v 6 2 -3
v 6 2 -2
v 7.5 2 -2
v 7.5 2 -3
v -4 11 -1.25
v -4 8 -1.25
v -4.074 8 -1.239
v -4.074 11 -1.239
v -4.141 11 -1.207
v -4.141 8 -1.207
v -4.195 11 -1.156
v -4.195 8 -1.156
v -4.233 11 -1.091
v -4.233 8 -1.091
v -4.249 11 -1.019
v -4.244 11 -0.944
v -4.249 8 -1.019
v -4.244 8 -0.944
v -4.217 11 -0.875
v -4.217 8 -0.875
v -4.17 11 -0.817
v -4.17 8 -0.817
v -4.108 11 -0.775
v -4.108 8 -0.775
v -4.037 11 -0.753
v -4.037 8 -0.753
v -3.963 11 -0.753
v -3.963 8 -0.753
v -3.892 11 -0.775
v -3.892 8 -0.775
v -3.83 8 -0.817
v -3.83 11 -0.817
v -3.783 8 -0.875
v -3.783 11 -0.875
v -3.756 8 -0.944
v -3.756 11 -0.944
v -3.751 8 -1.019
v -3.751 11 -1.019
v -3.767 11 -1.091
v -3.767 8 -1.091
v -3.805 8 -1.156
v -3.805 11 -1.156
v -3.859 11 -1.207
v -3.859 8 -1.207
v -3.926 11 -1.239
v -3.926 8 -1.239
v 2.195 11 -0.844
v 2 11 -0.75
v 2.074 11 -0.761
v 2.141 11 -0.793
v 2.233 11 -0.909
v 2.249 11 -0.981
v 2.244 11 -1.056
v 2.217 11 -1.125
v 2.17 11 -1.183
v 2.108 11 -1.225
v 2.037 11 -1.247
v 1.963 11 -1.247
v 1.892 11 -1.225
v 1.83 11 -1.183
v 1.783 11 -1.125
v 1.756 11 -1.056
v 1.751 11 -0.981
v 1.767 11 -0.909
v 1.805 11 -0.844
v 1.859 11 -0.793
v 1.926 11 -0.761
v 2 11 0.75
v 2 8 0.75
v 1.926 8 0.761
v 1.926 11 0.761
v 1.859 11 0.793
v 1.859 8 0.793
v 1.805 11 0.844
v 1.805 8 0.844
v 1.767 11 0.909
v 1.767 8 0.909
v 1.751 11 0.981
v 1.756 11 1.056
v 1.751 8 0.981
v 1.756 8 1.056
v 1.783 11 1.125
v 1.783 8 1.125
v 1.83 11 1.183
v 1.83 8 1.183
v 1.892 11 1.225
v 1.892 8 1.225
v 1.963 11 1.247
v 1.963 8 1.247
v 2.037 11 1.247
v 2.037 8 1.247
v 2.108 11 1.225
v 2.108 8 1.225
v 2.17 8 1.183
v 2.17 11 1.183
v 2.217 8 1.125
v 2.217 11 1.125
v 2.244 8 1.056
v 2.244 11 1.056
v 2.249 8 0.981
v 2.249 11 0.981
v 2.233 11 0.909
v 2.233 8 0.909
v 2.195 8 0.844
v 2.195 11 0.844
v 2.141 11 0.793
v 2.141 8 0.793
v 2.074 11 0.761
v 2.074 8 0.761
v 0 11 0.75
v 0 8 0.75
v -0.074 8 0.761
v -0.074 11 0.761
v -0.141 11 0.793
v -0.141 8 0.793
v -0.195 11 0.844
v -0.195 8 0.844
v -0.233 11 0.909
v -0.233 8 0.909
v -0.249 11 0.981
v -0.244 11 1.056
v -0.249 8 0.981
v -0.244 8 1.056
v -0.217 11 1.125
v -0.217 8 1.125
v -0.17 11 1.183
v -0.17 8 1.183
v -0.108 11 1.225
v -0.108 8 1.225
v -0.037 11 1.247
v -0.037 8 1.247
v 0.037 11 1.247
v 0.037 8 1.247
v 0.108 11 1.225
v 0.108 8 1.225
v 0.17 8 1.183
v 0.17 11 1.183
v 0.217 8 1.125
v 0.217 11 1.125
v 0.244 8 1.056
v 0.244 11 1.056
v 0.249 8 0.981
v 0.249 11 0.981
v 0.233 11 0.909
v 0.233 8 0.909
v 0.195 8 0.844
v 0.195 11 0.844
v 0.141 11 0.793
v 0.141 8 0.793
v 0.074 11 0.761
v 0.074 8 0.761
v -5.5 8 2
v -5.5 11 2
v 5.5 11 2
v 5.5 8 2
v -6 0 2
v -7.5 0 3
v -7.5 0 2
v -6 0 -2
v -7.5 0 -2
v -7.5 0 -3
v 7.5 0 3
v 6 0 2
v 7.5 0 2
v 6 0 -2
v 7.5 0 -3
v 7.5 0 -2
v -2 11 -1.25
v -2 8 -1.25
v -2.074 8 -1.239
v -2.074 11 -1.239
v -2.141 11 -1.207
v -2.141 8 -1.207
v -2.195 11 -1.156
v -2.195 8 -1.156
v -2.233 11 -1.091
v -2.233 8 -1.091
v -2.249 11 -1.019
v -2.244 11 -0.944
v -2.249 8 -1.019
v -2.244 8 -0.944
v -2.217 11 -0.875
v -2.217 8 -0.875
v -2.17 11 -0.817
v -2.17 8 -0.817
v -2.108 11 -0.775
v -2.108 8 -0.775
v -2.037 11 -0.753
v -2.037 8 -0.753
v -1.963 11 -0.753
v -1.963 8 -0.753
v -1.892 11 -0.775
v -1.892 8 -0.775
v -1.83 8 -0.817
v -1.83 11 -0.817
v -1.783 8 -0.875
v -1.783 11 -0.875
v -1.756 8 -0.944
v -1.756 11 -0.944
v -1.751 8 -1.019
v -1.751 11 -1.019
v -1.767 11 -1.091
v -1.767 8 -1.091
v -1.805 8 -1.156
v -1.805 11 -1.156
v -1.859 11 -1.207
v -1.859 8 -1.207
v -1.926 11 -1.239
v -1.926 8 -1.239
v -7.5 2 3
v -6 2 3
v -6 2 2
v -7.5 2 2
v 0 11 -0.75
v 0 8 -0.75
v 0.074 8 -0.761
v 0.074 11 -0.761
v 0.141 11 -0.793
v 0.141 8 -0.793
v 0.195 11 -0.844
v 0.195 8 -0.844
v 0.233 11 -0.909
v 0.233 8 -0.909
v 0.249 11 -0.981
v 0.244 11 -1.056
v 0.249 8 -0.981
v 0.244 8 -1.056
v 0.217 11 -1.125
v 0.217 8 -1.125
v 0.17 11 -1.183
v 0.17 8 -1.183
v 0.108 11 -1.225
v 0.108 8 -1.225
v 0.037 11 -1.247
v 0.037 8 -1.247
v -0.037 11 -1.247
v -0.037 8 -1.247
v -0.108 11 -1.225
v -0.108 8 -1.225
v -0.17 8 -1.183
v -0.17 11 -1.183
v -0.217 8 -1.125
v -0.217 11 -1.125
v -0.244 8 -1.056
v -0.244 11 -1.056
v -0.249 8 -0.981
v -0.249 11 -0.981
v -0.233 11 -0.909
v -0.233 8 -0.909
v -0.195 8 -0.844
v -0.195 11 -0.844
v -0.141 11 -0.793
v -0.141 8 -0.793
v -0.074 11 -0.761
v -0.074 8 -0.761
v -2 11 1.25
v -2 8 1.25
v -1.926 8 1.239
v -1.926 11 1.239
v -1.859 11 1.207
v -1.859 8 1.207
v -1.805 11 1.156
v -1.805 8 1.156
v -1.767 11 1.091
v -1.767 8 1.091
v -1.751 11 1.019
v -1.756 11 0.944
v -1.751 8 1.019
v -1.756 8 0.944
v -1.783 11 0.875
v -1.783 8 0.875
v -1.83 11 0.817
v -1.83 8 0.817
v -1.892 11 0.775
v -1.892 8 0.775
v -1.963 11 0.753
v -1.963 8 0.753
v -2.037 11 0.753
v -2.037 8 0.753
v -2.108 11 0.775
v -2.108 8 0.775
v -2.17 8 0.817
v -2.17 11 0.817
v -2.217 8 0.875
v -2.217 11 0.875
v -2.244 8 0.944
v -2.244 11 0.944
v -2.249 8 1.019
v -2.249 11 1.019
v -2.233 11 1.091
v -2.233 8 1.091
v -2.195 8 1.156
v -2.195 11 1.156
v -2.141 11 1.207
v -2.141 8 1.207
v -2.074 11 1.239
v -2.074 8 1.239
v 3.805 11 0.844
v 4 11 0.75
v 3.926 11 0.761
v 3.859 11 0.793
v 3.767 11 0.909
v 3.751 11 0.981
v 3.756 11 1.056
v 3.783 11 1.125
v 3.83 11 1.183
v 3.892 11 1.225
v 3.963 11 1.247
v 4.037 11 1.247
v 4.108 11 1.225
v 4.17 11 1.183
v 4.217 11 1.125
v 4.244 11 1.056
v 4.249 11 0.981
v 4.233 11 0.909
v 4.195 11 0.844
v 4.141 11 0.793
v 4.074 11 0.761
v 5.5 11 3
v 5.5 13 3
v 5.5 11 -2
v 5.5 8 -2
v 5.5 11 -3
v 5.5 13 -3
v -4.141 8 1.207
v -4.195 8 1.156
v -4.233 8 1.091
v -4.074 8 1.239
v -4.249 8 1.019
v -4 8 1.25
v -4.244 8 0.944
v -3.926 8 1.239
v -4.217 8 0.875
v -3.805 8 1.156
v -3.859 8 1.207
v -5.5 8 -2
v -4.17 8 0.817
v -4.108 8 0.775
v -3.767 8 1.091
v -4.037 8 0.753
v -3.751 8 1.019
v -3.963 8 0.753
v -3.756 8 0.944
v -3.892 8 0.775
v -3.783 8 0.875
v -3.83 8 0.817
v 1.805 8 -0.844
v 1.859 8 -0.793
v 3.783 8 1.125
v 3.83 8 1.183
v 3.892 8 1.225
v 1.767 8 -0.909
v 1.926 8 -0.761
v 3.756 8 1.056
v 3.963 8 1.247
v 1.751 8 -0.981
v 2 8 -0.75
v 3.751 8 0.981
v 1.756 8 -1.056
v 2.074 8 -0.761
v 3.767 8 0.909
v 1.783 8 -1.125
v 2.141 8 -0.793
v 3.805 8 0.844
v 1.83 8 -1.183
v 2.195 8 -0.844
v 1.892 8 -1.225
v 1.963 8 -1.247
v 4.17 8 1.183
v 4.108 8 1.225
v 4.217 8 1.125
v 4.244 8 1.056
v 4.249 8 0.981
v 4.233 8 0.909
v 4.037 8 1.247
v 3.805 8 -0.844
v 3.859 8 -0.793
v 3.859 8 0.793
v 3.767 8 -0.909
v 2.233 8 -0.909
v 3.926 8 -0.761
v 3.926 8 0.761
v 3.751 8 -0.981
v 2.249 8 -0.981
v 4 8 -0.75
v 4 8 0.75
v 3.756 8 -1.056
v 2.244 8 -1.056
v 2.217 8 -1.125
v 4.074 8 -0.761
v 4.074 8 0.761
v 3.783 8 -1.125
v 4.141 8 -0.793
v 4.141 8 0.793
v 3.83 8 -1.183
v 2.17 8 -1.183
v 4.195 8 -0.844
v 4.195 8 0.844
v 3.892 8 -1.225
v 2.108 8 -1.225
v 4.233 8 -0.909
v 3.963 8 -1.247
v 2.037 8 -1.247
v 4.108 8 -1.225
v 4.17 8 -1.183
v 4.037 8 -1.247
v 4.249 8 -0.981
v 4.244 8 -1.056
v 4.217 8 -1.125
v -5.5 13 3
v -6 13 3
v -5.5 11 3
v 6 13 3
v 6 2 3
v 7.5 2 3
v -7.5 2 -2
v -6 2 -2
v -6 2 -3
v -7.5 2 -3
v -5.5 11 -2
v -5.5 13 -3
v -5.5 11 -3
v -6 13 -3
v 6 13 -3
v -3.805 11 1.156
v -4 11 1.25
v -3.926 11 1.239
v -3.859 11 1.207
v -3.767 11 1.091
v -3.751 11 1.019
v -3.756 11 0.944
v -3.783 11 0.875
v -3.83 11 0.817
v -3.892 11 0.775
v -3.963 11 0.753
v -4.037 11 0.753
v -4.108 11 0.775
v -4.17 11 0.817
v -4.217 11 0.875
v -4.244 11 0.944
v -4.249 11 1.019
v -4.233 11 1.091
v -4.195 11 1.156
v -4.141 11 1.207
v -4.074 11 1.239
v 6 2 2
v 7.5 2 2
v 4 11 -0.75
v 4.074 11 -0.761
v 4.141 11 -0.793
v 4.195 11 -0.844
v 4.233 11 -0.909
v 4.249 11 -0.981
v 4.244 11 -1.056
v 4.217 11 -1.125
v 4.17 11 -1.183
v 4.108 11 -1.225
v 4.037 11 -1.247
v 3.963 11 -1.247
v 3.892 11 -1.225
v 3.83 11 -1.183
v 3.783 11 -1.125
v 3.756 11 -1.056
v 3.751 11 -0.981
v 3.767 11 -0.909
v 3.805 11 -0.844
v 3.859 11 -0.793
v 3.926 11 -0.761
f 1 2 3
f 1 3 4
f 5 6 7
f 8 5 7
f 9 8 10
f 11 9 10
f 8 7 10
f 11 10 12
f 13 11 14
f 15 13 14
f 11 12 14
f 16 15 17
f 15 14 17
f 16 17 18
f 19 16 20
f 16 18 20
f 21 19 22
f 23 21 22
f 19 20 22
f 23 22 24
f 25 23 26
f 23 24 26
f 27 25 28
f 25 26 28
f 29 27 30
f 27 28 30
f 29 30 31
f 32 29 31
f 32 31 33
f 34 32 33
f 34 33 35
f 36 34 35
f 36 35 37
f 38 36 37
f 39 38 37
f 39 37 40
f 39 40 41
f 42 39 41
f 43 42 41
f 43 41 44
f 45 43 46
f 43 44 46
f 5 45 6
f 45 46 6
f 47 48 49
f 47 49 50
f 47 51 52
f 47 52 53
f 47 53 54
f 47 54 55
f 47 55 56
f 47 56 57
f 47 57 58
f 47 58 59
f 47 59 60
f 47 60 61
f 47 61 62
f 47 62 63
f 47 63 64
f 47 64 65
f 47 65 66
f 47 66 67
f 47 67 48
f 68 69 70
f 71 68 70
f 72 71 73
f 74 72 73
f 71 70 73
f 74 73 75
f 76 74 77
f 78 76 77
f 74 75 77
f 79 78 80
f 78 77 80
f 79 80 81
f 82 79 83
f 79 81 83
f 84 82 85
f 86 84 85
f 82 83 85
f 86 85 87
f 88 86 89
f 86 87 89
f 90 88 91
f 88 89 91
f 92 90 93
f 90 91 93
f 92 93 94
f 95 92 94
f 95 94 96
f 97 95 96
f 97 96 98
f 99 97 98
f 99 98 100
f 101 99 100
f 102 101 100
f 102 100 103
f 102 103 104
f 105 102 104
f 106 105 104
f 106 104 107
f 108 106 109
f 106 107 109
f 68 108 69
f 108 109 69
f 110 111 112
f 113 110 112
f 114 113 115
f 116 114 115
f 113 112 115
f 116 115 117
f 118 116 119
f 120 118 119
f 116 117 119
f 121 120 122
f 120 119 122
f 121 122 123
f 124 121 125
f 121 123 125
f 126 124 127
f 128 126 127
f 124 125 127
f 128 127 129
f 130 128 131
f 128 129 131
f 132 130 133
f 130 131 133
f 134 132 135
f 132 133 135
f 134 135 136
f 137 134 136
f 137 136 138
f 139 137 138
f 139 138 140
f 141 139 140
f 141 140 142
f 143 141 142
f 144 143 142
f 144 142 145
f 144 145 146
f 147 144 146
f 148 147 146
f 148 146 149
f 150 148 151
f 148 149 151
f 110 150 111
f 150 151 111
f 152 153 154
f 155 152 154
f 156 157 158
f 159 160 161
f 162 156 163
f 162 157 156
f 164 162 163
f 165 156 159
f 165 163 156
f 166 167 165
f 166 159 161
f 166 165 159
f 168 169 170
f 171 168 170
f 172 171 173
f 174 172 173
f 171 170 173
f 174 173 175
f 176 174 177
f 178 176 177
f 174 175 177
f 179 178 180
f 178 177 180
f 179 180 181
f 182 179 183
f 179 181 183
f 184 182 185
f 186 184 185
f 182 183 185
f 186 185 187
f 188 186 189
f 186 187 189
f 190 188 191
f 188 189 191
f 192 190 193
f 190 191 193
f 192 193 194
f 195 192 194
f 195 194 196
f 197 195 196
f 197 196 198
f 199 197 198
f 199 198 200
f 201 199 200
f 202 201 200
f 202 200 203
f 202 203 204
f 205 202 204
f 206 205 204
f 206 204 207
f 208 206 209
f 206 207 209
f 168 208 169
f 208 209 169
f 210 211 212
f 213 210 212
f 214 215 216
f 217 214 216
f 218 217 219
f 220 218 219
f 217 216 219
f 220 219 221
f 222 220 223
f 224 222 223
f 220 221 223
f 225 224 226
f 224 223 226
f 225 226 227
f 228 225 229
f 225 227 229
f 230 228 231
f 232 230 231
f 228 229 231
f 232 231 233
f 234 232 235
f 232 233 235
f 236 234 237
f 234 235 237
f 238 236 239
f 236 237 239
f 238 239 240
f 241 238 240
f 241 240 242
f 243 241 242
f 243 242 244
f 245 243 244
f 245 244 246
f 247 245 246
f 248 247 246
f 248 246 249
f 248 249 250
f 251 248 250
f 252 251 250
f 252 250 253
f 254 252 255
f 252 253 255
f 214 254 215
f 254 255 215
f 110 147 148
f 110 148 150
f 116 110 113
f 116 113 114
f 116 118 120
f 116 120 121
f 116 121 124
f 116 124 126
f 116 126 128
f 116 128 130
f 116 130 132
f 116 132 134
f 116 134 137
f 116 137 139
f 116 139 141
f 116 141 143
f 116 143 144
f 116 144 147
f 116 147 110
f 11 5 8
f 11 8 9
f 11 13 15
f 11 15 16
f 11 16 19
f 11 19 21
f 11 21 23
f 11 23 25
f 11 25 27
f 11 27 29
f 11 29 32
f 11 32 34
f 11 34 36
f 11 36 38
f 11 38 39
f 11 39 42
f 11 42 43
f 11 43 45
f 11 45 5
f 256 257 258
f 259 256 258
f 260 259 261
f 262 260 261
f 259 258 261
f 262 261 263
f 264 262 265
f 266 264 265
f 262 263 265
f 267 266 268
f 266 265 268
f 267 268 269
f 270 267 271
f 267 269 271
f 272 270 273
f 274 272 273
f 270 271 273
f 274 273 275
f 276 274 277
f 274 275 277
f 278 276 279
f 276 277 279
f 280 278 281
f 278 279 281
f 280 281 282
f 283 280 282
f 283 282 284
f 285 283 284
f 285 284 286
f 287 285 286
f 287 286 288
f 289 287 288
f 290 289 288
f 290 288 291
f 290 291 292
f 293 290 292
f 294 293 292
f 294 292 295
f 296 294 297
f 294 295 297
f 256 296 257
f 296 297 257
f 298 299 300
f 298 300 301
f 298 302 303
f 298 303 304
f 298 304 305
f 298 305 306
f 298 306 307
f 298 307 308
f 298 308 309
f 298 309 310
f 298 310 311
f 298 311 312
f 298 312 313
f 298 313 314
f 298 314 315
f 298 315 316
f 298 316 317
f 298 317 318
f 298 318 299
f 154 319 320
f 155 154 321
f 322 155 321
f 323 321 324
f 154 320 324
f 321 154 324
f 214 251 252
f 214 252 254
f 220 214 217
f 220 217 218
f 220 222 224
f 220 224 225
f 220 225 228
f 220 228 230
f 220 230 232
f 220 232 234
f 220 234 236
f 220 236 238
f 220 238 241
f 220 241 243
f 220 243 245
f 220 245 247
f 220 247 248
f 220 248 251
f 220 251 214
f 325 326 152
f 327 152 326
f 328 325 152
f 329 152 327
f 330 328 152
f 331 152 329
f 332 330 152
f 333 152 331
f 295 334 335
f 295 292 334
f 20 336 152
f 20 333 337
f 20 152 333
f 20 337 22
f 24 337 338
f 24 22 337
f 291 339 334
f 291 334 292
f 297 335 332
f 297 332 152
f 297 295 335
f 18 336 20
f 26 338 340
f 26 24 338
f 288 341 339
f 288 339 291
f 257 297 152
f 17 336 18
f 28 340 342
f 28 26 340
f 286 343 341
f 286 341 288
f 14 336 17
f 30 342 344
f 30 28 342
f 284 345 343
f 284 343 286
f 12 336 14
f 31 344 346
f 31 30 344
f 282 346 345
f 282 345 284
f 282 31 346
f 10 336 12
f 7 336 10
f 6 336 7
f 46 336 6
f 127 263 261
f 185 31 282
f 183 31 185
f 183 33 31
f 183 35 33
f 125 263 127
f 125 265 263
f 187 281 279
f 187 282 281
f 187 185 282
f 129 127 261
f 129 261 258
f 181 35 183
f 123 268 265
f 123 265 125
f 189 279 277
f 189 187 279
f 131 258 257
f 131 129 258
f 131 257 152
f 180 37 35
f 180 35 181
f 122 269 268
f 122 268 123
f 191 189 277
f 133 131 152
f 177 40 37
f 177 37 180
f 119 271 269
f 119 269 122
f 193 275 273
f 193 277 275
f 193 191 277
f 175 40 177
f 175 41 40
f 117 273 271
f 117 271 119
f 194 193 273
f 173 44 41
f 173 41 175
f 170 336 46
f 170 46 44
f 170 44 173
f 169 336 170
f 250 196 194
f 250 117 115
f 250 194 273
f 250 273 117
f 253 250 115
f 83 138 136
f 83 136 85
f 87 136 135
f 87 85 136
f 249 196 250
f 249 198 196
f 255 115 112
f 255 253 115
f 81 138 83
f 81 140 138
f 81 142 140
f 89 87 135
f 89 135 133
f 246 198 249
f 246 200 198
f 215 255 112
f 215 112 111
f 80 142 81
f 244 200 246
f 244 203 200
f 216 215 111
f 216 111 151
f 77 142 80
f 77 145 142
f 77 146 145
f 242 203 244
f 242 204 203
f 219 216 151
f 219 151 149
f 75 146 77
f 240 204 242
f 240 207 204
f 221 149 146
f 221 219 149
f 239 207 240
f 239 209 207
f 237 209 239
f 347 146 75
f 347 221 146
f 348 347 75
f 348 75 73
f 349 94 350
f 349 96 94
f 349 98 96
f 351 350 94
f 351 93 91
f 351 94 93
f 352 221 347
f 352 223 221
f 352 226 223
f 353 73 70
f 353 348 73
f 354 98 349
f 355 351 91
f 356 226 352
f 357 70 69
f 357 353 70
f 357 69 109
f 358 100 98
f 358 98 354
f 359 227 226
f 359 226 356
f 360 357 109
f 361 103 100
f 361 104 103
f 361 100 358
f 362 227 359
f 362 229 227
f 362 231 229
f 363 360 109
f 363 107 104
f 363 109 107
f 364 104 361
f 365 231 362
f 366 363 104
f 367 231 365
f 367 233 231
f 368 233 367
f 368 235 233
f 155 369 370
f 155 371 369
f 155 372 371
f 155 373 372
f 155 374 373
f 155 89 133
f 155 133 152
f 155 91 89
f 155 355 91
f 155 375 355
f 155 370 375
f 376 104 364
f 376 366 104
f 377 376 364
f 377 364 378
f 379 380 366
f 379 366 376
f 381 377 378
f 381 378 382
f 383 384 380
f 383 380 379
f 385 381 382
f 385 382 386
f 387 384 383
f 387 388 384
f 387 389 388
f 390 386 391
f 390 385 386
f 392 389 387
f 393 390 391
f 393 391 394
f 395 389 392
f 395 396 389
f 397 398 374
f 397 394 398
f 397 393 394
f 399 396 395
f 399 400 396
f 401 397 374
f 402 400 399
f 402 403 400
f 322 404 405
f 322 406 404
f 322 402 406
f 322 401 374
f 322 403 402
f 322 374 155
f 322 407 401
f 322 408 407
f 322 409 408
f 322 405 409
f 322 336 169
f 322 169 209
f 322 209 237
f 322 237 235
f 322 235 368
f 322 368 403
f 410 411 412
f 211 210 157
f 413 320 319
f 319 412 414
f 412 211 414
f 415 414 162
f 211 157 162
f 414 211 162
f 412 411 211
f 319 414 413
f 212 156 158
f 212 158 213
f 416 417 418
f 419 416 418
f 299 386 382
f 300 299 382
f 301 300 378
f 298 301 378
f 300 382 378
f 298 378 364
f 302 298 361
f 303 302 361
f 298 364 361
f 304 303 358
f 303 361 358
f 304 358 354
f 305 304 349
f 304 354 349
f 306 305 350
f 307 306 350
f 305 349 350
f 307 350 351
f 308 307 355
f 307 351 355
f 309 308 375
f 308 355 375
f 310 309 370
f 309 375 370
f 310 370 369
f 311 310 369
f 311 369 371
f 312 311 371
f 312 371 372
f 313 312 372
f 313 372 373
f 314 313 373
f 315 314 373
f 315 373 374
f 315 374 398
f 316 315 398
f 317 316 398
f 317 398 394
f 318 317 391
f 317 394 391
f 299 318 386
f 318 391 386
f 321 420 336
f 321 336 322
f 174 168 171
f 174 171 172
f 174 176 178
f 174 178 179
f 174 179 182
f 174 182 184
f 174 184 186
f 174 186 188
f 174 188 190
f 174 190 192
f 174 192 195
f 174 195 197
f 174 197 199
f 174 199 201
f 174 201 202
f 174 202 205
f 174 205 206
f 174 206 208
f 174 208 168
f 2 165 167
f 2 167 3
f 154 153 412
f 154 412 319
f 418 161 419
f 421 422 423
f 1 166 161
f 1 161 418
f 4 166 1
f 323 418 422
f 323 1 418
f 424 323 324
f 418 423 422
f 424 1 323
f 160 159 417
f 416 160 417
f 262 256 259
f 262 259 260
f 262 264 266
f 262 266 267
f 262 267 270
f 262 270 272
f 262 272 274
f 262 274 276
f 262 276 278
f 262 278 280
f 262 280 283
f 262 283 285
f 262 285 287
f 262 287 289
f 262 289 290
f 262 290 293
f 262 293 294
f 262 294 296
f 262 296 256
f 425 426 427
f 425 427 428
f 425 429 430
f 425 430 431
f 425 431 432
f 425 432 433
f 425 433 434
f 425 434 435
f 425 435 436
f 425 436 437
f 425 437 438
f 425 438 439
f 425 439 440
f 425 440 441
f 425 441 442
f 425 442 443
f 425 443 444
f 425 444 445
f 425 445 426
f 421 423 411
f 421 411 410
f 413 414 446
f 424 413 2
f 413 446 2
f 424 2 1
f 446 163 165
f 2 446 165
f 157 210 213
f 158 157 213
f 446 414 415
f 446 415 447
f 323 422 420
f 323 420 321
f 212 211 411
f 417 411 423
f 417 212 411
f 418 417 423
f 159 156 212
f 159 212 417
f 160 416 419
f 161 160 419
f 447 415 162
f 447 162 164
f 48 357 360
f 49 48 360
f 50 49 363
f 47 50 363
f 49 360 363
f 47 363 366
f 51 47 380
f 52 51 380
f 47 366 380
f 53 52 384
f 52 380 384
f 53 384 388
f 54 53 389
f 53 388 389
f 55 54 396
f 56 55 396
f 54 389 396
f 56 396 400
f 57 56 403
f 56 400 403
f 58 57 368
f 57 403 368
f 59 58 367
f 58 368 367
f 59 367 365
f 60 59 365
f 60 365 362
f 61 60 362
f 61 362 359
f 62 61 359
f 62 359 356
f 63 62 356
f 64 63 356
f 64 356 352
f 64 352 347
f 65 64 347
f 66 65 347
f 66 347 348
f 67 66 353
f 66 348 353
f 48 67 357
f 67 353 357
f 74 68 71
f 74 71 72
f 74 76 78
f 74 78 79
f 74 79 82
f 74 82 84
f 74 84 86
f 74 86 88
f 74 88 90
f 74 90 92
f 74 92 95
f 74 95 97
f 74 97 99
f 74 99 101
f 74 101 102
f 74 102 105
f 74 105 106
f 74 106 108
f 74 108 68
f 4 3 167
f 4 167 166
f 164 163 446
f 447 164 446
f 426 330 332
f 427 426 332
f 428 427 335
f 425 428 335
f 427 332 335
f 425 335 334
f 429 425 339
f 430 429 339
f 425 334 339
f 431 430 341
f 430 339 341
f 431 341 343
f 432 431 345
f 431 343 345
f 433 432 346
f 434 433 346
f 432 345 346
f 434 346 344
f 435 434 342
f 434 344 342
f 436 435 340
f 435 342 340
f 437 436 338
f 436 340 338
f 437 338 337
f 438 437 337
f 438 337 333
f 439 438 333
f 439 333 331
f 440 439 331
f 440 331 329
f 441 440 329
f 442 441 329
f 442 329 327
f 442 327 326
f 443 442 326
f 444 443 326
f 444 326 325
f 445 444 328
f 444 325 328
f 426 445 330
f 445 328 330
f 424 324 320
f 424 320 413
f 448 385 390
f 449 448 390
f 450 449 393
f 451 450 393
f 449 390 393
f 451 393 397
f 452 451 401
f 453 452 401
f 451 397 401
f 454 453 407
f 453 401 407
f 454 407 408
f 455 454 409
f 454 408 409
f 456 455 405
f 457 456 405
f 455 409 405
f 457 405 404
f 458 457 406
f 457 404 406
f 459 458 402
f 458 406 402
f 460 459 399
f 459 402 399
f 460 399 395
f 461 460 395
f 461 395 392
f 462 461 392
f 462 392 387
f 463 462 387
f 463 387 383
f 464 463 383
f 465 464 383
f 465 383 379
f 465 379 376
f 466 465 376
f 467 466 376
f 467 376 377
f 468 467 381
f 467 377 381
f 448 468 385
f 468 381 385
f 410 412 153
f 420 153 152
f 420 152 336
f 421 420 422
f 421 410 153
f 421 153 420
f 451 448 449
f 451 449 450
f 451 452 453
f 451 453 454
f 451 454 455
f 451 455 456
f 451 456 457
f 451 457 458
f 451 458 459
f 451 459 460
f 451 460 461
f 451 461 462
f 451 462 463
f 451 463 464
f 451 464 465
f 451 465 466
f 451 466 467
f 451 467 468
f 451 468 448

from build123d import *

# Parameters (mm, degrees)
SKETCH1_W           = 12
SKETCH1_H           = 6
BOSS_EXTRUDE1_DEPTH = 13
SKETCH2_W           = 1
SKETCH2_H           = 2
BOSS_EXTRUDE2_DEPTH = 1.5
SKETCH3_W           = 11
SKETCH3_H           = 4
CUT_EXTRUDE1_DEPTH  = 5
SKETCH4_W           = 11
SKETCH4_H           = 1
CUT_EXTRUDE2_DEPTH  = 2
SKETCH5_R           = 0.25
BOSS_EXTRUDE3_DEPTH = 3


with BuildPart() as part:
    # Sketch1 → Boss-Extrude1 (new body)
    with BuildSketch(Plane(origin=(0, 0, 0), x_dir=(1, 0, 0), z_dir=(0, 1, 0))):
        Rectangle(SKETCH1_W, SKETCH1_H)
    extrude(amount=BOSS_EXTRUDE1_DEPTH)

    # Sketch2 → Boss-Extrude2 (add)
    with BuildSketch(Plane(origin=(6, 0, 0), x_dir=(0, 0, -1), z_dir=(1, 0, 0))):
        with Locations((-2.5, 1)):
            Rectangle(SKETCH2_W, SKETCH2_H)
        with Locations((2.5, 1)):
            Rectangle(SKETCH2_W, SKETCH2_H)
    boss_extrude2 = extrude(amount=BOSS_EXTRUDE2_DEPTH)

    # Mirror1: Boss-Extrude2 across plane
    add(boss_extrude2.mirror(Plane(origin=(0, 0, 0), x_dir=(0, 0, 1), z_dir=(1, 0, 0))))

    # Sketch3 → Cut-Extrude1 (cut)
    with BuildSketch(Plane(origin=(0, 13, 0), x_dir=(1, 0, 0), z_dir=(0, 1, 0))):
        Rectangle(SKETCH3_W, SKETCH3_H)
    extrude(amount=-CUT_EXTRUDE1_DEPTH, mode=Mode.SUBTRACT)

    # Sketch4 → Cut-Extrude2 (cut)
    with BuildSketch(Plane(origin=(0, 13, 0), x_dir=(1, 0, 0), z_dir=(0, 1, 0))):
        with Locations((0, 2.5)):
            Rectangle(SKETCH4_W, SKETCH4_H)
        with Locations((0, -2.5)):
            Rectangle(SKETCH4_W, SKETCH4_H)
    extrude(amount=-CUT_EXTRUDE2_DEPTH, mode=Mode.SUBTRACT)

    # Sketch5 → Boss-Extrude3 (add)
    with BuildSketch(Plane(origin=(0, 8, 0), x_dir=(1, 0, 0), z_dir=(0, 1, 0))):
        with Locations((0, 1)):
            Circle(SKETCH5_R)
        with Locations((2, 1)):
            Circle(SKETCH5_R)
        with Locations((4, 1)):
            Circle(SKETCH5_R)
        with Locations((-4, 1)):
            Circle(SKETCH5_R)
        with Locations((-2, 1)):
            Circle(SKETCH5_R)
        with Locations((4, -1)):
            Circle(SKETCH5_R)
        with Locations((2, -1)):
            Circle(SKETCH5_R)
        with Locations((0, -1)):
            Circle(SKETCH5_R)
        with Locations((-2, -1)):
            Circle(SKETCH5_R)
        with Locations((-4, -1)):
            Circle(SKETCH5_R)
    extrude(amount=BOSS_EXTRUDE3_DEPTH)


solid = part.part
